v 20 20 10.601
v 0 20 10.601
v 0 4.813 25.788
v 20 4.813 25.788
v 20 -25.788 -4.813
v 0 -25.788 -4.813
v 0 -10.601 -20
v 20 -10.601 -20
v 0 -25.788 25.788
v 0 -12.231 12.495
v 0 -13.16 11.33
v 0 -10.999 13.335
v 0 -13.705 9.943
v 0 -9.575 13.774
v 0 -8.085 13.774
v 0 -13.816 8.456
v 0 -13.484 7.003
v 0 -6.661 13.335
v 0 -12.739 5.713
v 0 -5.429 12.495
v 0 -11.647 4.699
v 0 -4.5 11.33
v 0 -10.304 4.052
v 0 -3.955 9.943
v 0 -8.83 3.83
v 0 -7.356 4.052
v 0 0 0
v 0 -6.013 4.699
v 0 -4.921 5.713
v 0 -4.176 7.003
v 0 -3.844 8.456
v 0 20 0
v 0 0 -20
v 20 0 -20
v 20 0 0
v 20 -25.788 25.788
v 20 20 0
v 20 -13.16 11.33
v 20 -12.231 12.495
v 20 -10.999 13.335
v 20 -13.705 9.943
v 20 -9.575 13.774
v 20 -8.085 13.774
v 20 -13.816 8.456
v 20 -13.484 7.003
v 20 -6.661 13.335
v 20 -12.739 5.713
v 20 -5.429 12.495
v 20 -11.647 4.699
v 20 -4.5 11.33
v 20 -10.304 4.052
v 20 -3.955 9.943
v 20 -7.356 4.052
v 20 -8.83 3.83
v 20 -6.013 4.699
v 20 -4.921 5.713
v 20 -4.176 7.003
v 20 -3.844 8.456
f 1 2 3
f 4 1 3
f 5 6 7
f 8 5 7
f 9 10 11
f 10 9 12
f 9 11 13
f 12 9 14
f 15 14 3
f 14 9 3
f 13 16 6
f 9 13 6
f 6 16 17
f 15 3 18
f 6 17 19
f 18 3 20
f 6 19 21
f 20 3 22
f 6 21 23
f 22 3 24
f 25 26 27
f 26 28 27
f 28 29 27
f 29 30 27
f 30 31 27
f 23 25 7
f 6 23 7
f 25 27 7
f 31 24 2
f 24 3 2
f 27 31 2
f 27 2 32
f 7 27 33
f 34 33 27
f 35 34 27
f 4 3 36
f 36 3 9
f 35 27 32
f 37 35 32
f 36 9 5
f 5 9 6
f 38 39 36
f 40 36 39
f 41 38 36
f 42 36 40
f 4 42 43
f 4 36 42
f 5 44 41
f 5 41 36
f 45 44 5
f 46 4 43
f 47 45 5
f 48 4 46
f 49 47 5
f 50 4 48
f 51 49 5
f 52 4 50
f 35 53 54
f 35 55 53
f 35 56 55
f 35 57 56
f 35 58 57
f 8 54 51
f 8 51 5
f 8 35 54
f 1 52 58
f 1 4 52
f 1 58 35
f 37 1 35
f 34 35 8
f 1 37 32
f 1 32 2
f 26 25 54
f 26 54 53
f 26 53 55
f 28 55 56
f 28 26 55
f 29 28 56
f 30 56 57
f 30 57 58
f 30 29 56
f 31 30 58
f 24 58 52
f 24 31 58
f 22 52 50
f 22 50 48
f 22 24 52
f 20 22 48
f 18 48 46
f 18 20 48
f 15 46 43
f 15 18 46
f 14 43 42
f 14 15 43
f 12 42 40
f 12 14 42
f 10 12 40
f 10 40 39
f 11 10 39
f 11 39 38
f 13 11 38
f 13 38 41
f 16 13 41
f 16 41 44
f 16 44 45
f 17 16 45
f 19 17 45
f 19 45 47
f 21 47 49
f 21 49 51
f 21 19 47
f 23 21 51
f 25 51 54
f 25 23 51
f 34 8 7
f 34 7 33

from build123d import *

# Parameters (mm, degrees)
SKIZZE1_R                       = 5
AUFSATZ_LINEAR_AUSTRAGEN1_DEPTH = 20


with BuildPart() as part:
    # Skizze1 → Aufsatz-Linear austragen1 (new body)
    with BuildSketch(Plane(origin=(0, 0, 0), x_dir=(0, 0, -1), z_dir=(1, 0, 0))):
        Polygon((0, 0), (0, 20), (-10.600988733, 20), (-25.787709792, 4.813278942), (-25.787709792, -25.787709792), (4.813278942, -25.787709792), (20, -10.600988733), (20, 0), align=None)
        with Locations((-8.83007243, -8.83007243)):
            Circle(SKIZZE1_R, mode=Mode.SUBTRACT)
    extrude(amount=AUFSATZ_LINEAR_AUSTRAGEN1_DEPTH)


solid = part.part
